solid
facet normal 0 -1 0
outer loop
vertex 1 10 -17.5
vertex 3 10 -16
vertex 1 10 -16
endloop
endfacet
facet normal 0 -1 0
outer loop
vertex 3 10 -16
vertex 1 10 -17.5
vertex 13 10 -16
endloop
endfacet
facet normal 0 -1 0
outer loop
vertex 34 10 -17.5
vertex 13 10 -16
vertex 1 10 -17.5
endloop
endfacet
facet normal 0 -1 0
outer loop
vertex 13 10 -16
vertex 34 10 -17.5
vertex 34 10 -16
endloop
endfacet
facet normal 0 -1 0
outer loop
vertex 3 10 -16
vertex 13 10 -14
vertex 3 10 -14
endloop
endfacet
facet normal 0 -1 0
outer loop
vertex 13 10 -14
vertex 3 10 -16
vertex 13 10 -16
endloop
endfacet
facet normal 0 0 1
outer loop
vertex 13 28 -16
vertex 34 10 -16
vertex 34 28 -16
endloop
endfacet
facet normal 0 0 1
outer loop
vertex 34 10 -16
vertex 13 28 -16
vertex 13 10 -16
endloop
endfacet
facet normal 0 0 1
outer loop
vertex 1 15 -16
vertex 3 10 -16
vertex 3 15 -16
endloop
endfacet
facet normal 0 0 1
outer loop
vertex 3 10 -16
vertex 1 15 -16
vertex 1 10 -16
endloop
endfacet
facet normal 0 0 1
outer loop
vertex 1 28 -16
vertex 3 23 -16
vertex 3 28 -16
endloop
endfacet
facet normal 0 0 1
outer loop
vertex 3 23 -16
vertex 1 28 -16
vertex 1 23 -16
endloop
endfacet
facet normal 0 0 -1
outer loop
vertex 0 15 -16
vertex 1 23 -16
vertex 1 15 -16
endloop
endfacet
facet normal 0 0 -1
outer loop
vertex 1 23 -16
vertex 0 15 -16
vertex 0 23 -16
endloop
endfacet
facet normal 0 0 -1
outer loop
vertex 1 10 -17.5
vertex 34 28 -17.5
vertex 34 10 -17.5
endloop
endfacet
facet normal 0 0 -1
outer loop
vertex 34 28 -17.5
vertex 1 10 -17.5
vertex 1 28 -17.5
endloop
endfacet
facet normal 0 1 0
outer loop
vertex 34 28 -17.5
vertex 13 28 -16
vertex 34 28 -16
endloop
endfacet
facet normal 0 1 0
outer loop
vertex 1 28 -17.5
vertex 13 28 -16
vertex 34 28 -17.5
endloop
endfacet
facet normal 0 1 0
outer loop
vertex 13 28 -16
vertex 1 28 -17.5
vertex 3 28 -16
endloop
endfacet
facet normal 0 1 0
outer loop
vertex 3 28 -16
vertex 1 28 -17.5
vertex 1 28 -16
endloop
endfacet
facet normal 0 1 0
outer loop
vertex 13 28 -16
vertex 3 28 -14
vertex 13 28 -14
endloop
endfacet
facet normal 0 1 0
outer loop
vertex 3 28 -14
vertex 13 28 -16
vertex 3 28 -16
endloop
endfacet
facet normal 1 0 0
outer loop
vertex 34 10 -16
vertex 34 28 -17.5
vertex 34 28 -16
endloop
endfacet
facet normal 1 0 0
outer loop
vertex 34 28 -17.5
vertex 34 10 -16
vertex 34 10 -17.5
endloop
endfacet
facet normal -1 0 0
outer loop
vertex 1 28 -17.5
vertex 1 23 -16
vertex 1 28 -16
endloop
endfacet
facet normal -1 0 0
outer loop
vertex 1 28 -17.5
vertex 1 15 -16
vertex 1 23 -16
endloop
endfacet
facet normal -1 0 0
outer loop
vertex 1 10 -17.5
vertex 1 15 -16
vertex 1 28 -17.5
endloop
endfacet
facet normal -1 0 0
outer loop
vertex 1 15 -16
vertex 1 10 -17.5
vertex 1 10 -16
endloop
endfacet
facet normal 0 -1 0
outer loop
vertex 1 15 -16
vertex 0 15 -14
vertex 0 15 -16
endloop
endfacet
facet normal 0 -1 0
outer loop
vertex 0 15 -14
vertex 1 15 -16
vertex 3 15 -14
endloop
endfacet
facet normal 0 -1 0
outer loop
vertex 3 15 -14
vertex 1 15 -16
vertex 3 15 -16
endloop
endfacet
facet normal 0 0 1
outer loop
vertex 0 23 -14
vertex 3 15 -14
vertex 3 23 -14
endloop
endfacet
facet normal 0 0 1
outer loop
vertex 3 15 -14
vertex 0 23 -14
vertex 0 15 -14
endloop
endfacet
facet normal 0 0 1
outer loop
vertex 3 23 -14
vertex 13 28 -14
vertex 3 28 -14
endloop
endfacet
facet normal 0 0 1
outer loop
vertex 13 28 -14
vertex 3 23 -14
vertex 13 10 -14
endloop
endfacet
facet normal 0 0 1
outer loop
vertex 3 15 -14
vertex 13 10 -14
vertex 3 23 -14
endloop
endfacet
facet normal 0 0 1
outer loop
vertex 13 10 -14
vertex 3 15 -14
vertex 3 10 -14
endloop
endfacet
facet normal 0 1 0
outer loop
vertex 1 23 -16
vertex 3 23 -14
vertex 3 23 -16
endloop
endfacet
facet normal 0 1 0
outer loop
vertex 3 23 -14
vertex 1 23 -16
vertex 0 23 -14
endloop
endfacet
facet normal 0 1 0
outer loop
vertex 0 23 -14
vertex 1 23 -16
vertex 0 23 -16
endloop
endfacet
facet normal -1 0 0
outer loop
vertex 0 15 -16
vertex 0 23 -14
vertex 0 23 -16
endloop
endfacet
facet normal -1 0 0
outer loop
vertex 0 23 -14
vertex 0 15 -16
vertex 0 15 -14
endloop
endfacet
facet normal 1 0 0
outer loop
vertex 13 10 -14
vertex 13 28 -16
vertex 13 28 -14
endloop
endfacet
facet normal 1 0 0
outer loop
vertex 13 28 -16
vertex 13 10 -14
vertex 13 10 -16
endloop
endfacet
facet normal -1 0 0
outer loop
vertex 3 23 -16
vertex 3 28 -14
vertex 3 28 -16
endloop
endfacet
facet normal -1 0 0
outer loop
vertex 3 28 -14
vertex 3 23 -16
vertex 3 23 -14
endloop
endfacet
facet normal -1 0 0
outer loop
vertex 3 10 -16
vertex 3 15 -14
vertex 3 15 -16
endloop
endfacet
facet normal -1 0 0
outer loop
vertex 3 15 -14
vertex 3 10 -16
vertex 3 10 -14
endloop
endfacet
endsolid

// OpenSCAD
size = [5, 2];
border = 5;
boxDepth = 15;

//top
/* difference() {

  cube([19.05*size[0]+2*border, 19.05*size[1]+2*border, 5.5]);

  union() {
    translate([border, border, 2]) {
      for(i = [0 : 1 : size[0]-1]) for(j = [0 : 1 : size[1]-1]) { //all the cutouts for the switches
        translate([i*19.05+border/2, j*19.05+border/2, 0]) cutOut();
      }
    }
    translate([border, border, 3.5]) cube([(size[0]) * 19.05, (size[1]) * 19.05, 2]);
    translate([border/2, border/2, 0]) cube([(size[0]) * 19.05 + border, (size[1]) * 19.05 + border, 2]);
  }
} */

//bottom
translate([0, 0, -20]) {
  difference() {
    /* translate([0, 0, 0]) cube([(size[0]) * 19.05 + 2*border, (size[1]) * 19.05 + 2*border, boxDepth]); //main cube

    translate([border, border, border/2]) cube([(size[0]) * 19.05, (size[1]) * 19.05, boxDepth-border/2]); //main hollow bit */

    translate([0, 18+5+border, border/2]) proMicro();
  }
  /* difference() {
    translate([0, 0, 15]) cube([(size[0]) * 19.05 + border*2, (size[1]) * 19.05 + border*2, 2]); //bit at top
    difference() {
      translate([0, 0, 15]) cube([(size[0]) * 19.05 + border*2, (size[1]) * 19.05 + border*2, 2]); //bit at top
      translate([border/2, border/2, 15]) cube([(size[0]) * 19.05 + border, (size[1]) * 19.05 + border, 2]); //bit at top
    }
    translate([border, border, 15]) cube([(size[0]) * 19.05, (size[1]) * 19.05, 2]); //bit at top
  } */
}

//pro micro
module proMicro() {
  translate([0, 0, 0]) rotate([0, 0, -90]) union() {
    translate([0, 1, 0]) cube([18, 33, 1.5]);
    translate([5, 0, 1.5]) cube([8, 5, 2]);
    translate([0, 3, 1.5]) cube([18, 2*border, 2]);
  }
}

module cutOut() {
  union() {
    translate([1, 1, 0]) cube([14, 14, 1.5]);
  }
}
